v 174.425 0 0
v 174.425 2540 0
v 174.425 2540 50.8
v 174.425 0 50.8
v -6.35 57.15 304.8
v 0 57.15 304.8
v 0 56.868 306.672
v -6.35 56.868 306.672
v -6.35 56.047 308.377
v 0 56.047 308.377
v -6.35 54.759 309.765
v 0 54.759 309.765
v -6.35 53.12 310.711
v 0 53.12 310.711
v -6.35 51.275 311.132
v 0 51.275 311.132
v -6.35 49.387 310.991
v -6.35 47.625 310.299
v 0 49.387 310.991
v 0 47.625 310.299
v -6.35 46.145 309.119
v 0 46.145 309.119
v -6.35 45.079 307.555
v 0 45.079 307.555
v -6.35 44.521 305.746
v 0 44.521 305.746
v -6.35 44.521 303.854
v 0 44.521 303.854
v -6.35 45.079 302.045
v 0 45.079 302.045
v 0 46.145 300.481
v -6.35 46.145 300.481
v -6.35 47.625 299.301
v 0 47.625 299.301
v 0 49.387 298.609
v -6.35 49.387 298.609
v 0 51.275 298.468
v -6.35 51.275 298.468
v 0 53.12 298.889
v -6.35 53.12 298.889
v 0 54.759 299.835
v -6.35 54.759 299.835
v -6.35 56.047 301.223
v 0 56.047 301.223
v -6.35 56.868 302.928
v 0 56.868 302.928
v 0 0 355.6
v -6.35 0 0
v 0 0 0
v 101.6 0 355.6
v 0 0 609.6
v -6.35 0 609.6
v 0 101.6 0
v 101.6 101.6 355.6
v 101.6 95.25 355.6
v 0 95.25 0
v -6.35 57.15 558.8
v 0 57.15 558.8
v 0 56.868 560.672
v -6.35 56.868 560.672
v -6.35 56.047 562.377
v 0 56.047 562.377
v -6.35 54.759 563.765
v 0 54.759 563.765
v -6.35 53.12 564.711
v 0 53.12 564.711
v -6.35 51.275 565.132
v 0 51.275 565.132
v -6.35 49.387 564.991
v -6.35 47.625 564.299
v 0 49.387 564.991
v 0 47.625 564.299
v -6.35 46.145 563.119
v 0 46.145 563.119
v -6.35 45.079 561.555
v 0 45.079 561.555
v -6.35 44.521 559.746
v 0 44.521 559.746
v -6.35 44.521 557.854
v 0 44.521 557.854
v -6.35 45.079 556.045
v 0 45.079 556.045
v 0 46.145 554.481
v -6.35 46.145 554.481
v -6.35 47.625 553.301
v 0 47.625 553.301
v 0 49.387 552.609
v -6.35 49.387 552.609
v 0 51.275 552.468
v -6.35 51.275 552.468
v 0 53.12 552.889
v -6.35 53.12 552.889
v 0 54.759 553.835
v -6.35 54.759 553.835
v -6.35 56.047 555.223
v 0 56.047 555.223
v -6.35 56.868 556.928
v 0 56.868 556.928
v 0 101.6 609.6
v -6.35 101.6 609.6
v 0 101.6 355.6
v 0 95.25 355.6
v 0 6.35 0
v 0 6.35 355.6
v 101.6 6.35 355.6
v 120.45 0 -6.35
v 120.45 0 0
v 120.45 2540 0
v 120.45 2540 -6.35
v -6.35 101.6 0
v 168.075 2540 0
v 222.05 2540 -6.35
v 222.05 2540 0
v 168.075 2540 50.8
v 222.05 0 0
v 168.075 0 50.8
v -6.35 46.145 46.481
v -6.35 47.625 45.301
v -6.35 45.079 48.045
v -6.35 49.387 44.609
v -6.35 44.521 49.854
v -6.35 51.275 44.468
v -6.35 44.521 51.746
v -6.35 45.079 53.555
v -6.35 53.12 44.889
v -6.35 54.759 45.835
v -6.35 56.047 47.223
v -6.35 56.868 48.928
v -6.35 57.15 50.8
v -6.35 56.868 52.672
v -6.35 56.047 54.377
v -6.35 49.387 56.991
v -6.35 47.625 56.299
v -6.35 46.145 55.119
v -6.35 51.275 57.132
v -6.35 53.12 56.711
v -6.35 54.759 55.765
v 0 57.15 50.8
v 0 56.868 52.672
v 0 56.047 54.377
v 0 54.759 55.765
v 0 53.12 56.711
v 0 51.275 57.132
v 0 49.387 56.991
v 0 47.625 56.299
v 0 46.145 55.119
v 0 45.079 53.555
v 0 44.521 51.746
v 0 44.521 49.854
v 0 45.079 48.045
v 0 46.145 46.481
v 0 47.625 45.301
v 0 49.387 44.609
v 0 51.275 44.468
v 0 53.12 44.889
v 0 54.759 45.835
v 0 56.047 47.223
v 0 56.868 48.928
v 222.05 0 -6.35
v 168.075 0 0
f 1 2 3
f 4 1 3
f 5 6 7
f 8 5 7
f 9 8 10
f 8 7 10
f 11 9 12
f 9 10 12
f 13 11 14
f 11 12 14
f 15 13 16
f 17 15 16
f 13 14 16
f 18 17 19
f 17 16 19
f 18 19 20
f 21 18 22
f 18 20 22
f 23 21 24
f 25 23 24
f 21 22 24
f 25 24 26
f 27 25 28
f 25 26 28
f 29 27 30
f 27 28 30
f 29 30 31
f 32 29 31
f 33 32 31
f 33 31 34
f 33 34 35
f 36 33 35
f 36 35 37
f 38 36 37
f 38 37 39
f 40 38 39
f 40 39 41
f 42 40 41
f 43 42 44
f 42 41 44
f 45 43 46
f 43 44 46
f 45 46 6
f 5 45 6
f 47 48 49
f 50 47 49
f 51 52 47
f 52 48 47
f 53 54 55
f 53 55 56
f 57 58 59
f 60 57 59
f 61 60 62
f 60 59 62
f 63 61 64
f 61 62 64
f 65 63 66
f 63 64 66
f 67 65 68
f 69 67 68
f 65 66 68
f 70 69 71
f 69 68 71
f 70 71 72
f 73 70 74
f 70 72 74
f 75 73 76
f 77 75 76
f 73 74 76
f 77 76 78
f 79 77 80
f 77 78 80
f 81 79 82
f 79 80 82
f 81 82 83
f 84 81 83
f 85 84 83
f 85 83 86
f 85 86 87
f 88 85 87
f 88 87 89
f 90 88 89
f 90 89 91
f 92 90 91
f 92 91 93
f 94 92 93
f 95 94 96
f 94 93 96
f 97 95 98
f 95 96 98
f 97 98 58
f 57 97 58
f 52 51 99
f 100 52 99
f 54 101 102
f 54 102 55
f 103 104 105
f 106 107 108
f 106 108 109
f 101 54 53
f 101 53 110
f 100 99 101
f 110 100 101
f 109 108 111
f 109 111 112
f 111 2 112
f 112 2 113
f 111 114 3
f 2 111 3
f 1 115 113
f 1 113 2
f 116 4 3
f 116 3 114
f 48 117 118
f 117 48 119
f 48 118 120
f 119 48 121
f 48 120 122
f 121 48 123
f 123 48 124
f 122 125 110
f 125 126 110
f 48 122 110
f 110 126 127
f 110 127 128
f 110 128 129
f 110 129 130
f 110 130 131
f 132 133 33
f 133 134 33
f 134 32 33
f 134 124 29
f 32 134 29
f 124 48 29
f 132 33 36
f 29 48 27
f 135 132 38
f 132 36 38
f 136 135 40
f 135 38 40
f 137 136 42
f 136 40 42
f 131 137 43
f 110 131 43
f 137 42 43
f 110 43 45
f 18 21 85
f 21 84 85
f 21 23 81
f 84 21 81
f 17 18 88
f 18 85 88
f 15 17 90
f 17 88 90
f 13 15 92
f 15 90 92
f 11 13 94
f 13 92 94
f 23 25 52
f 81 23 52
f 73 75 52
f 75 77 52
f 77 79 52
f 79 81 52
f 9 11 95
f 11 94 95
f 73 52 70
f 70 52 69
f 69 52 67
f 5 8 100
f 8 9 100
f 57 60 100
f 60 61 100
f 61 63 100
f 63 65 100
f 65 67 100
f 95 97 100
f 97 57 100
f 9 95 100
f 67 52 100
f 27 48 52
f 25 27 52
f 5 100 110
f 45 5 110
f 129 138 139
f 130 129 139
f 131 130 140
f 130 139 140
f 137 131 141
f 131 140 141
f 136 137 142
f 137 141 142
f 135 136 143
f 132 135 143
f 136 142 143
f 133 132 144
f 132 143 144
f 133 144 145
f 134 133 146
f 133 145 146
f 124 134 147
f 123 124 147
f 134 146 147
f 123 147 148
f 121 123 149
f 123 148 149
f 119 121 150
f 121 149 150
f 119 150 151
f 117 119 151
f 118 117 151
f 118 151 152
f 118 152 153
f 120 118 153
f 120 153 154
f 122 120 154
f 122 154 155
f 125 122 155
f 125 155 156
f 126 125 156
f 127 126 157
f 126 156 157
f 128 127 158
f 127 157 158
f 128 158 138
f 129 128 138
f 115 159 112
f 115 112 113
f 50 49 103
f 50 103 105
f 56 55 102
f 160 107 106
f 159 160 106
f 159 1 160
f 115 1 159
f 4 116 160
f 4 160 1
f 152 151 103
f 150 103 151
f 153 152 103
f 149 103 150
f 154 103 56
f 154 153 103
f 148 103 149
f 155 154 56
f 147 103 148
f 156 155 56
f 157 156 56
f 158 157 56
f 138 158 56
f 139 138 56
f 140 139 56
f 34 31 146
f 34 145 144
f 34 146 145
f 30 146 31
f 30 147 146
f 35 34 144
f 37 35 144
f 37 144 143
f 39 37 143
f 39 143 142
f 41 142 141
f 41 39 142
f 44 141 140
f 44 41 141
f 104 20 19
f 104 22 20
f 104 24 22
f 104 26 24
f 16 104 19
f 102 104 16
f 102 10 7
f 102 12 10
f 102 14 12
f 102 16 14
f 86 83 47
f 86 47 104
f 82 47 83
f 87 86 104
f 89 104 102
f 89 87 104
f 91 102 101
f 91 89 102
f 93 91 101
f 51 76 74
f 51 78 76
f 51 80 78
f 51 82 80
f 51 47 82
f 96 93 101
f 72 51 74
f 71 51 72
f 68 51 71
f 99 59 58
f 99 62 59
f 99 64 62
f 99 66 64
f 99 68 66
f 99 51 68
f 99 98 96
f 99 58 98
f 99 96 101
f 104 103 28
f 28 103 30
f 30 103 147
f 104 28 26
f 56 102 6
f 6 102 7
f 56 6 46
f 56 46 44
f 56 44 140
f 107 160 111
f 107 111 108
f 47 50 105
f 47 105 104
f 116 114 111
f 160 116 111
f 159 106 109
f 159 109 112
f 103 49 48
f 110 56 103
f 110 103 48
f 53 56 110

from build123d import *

# Parameters (mm, degrees)
F0_W     = 101.6
F0_H     = 609.6
F0_R     = 6.35
F1_DEPTH = 6.35
F3_DEPTH = 6.35
F5_DEPTH = 6.35
F7_DEPTH = 2540


with BuildPart() as f1:
    # F0 (on Right) → F1 (new body)
    with BuildSketch(Plane.YZ):
        with Locations((50.8, 304.8)):
            Rectangle(F0_W, F0_H)
        with Locations((50.8, 50.8)):
            Circle(F0_R, mode=Mode.SUBTRACT)
        with Locations((50.8, 304.8)):
            Circle(F0_R, mode=Mode.SUBTRACT)
        with Locations((50.8, 558.8)):
            Circle(F0_R, mode=Mode.SUBTRACT)
    extrude(amount=-F1_DEPTH)

    # F2 (on Front) → F3 (join)
    with BuildSketch(Plane.XZ):
        Polygon((0, 355.6), (0, 0), (101.6, 355.6), align=None)
    extrude(amount=-F3_DEPTH)

    # F4 (on face) → F5 (join)
    with BuildSketch(Plane(origin=(0, 101.6, 0), x_dir=(-1, 0, 0), z_dir=(0, 1, 0))):
        Polygon((-101.6, 355.6), (0, 0), (0, 355.6), align=None)
    extrude(amount=-F5_DEPTH)


with BuildPart() as f7:
    # F6 (on Front) → F7 (new body)
    with BuildSketch(Plane.XZ):
        Polygon((168.075445, 50.8), (168.075445, 0), (120.450445, 0), (120.450445, -6.35), (222.050445, -6.35), (222.050445, 0), (174.425445, 0), (174.425445, 50.8), align=None)
    extrude(amount=-F7_DEPTH)


solid = Compound([f1.part, f7.part])
